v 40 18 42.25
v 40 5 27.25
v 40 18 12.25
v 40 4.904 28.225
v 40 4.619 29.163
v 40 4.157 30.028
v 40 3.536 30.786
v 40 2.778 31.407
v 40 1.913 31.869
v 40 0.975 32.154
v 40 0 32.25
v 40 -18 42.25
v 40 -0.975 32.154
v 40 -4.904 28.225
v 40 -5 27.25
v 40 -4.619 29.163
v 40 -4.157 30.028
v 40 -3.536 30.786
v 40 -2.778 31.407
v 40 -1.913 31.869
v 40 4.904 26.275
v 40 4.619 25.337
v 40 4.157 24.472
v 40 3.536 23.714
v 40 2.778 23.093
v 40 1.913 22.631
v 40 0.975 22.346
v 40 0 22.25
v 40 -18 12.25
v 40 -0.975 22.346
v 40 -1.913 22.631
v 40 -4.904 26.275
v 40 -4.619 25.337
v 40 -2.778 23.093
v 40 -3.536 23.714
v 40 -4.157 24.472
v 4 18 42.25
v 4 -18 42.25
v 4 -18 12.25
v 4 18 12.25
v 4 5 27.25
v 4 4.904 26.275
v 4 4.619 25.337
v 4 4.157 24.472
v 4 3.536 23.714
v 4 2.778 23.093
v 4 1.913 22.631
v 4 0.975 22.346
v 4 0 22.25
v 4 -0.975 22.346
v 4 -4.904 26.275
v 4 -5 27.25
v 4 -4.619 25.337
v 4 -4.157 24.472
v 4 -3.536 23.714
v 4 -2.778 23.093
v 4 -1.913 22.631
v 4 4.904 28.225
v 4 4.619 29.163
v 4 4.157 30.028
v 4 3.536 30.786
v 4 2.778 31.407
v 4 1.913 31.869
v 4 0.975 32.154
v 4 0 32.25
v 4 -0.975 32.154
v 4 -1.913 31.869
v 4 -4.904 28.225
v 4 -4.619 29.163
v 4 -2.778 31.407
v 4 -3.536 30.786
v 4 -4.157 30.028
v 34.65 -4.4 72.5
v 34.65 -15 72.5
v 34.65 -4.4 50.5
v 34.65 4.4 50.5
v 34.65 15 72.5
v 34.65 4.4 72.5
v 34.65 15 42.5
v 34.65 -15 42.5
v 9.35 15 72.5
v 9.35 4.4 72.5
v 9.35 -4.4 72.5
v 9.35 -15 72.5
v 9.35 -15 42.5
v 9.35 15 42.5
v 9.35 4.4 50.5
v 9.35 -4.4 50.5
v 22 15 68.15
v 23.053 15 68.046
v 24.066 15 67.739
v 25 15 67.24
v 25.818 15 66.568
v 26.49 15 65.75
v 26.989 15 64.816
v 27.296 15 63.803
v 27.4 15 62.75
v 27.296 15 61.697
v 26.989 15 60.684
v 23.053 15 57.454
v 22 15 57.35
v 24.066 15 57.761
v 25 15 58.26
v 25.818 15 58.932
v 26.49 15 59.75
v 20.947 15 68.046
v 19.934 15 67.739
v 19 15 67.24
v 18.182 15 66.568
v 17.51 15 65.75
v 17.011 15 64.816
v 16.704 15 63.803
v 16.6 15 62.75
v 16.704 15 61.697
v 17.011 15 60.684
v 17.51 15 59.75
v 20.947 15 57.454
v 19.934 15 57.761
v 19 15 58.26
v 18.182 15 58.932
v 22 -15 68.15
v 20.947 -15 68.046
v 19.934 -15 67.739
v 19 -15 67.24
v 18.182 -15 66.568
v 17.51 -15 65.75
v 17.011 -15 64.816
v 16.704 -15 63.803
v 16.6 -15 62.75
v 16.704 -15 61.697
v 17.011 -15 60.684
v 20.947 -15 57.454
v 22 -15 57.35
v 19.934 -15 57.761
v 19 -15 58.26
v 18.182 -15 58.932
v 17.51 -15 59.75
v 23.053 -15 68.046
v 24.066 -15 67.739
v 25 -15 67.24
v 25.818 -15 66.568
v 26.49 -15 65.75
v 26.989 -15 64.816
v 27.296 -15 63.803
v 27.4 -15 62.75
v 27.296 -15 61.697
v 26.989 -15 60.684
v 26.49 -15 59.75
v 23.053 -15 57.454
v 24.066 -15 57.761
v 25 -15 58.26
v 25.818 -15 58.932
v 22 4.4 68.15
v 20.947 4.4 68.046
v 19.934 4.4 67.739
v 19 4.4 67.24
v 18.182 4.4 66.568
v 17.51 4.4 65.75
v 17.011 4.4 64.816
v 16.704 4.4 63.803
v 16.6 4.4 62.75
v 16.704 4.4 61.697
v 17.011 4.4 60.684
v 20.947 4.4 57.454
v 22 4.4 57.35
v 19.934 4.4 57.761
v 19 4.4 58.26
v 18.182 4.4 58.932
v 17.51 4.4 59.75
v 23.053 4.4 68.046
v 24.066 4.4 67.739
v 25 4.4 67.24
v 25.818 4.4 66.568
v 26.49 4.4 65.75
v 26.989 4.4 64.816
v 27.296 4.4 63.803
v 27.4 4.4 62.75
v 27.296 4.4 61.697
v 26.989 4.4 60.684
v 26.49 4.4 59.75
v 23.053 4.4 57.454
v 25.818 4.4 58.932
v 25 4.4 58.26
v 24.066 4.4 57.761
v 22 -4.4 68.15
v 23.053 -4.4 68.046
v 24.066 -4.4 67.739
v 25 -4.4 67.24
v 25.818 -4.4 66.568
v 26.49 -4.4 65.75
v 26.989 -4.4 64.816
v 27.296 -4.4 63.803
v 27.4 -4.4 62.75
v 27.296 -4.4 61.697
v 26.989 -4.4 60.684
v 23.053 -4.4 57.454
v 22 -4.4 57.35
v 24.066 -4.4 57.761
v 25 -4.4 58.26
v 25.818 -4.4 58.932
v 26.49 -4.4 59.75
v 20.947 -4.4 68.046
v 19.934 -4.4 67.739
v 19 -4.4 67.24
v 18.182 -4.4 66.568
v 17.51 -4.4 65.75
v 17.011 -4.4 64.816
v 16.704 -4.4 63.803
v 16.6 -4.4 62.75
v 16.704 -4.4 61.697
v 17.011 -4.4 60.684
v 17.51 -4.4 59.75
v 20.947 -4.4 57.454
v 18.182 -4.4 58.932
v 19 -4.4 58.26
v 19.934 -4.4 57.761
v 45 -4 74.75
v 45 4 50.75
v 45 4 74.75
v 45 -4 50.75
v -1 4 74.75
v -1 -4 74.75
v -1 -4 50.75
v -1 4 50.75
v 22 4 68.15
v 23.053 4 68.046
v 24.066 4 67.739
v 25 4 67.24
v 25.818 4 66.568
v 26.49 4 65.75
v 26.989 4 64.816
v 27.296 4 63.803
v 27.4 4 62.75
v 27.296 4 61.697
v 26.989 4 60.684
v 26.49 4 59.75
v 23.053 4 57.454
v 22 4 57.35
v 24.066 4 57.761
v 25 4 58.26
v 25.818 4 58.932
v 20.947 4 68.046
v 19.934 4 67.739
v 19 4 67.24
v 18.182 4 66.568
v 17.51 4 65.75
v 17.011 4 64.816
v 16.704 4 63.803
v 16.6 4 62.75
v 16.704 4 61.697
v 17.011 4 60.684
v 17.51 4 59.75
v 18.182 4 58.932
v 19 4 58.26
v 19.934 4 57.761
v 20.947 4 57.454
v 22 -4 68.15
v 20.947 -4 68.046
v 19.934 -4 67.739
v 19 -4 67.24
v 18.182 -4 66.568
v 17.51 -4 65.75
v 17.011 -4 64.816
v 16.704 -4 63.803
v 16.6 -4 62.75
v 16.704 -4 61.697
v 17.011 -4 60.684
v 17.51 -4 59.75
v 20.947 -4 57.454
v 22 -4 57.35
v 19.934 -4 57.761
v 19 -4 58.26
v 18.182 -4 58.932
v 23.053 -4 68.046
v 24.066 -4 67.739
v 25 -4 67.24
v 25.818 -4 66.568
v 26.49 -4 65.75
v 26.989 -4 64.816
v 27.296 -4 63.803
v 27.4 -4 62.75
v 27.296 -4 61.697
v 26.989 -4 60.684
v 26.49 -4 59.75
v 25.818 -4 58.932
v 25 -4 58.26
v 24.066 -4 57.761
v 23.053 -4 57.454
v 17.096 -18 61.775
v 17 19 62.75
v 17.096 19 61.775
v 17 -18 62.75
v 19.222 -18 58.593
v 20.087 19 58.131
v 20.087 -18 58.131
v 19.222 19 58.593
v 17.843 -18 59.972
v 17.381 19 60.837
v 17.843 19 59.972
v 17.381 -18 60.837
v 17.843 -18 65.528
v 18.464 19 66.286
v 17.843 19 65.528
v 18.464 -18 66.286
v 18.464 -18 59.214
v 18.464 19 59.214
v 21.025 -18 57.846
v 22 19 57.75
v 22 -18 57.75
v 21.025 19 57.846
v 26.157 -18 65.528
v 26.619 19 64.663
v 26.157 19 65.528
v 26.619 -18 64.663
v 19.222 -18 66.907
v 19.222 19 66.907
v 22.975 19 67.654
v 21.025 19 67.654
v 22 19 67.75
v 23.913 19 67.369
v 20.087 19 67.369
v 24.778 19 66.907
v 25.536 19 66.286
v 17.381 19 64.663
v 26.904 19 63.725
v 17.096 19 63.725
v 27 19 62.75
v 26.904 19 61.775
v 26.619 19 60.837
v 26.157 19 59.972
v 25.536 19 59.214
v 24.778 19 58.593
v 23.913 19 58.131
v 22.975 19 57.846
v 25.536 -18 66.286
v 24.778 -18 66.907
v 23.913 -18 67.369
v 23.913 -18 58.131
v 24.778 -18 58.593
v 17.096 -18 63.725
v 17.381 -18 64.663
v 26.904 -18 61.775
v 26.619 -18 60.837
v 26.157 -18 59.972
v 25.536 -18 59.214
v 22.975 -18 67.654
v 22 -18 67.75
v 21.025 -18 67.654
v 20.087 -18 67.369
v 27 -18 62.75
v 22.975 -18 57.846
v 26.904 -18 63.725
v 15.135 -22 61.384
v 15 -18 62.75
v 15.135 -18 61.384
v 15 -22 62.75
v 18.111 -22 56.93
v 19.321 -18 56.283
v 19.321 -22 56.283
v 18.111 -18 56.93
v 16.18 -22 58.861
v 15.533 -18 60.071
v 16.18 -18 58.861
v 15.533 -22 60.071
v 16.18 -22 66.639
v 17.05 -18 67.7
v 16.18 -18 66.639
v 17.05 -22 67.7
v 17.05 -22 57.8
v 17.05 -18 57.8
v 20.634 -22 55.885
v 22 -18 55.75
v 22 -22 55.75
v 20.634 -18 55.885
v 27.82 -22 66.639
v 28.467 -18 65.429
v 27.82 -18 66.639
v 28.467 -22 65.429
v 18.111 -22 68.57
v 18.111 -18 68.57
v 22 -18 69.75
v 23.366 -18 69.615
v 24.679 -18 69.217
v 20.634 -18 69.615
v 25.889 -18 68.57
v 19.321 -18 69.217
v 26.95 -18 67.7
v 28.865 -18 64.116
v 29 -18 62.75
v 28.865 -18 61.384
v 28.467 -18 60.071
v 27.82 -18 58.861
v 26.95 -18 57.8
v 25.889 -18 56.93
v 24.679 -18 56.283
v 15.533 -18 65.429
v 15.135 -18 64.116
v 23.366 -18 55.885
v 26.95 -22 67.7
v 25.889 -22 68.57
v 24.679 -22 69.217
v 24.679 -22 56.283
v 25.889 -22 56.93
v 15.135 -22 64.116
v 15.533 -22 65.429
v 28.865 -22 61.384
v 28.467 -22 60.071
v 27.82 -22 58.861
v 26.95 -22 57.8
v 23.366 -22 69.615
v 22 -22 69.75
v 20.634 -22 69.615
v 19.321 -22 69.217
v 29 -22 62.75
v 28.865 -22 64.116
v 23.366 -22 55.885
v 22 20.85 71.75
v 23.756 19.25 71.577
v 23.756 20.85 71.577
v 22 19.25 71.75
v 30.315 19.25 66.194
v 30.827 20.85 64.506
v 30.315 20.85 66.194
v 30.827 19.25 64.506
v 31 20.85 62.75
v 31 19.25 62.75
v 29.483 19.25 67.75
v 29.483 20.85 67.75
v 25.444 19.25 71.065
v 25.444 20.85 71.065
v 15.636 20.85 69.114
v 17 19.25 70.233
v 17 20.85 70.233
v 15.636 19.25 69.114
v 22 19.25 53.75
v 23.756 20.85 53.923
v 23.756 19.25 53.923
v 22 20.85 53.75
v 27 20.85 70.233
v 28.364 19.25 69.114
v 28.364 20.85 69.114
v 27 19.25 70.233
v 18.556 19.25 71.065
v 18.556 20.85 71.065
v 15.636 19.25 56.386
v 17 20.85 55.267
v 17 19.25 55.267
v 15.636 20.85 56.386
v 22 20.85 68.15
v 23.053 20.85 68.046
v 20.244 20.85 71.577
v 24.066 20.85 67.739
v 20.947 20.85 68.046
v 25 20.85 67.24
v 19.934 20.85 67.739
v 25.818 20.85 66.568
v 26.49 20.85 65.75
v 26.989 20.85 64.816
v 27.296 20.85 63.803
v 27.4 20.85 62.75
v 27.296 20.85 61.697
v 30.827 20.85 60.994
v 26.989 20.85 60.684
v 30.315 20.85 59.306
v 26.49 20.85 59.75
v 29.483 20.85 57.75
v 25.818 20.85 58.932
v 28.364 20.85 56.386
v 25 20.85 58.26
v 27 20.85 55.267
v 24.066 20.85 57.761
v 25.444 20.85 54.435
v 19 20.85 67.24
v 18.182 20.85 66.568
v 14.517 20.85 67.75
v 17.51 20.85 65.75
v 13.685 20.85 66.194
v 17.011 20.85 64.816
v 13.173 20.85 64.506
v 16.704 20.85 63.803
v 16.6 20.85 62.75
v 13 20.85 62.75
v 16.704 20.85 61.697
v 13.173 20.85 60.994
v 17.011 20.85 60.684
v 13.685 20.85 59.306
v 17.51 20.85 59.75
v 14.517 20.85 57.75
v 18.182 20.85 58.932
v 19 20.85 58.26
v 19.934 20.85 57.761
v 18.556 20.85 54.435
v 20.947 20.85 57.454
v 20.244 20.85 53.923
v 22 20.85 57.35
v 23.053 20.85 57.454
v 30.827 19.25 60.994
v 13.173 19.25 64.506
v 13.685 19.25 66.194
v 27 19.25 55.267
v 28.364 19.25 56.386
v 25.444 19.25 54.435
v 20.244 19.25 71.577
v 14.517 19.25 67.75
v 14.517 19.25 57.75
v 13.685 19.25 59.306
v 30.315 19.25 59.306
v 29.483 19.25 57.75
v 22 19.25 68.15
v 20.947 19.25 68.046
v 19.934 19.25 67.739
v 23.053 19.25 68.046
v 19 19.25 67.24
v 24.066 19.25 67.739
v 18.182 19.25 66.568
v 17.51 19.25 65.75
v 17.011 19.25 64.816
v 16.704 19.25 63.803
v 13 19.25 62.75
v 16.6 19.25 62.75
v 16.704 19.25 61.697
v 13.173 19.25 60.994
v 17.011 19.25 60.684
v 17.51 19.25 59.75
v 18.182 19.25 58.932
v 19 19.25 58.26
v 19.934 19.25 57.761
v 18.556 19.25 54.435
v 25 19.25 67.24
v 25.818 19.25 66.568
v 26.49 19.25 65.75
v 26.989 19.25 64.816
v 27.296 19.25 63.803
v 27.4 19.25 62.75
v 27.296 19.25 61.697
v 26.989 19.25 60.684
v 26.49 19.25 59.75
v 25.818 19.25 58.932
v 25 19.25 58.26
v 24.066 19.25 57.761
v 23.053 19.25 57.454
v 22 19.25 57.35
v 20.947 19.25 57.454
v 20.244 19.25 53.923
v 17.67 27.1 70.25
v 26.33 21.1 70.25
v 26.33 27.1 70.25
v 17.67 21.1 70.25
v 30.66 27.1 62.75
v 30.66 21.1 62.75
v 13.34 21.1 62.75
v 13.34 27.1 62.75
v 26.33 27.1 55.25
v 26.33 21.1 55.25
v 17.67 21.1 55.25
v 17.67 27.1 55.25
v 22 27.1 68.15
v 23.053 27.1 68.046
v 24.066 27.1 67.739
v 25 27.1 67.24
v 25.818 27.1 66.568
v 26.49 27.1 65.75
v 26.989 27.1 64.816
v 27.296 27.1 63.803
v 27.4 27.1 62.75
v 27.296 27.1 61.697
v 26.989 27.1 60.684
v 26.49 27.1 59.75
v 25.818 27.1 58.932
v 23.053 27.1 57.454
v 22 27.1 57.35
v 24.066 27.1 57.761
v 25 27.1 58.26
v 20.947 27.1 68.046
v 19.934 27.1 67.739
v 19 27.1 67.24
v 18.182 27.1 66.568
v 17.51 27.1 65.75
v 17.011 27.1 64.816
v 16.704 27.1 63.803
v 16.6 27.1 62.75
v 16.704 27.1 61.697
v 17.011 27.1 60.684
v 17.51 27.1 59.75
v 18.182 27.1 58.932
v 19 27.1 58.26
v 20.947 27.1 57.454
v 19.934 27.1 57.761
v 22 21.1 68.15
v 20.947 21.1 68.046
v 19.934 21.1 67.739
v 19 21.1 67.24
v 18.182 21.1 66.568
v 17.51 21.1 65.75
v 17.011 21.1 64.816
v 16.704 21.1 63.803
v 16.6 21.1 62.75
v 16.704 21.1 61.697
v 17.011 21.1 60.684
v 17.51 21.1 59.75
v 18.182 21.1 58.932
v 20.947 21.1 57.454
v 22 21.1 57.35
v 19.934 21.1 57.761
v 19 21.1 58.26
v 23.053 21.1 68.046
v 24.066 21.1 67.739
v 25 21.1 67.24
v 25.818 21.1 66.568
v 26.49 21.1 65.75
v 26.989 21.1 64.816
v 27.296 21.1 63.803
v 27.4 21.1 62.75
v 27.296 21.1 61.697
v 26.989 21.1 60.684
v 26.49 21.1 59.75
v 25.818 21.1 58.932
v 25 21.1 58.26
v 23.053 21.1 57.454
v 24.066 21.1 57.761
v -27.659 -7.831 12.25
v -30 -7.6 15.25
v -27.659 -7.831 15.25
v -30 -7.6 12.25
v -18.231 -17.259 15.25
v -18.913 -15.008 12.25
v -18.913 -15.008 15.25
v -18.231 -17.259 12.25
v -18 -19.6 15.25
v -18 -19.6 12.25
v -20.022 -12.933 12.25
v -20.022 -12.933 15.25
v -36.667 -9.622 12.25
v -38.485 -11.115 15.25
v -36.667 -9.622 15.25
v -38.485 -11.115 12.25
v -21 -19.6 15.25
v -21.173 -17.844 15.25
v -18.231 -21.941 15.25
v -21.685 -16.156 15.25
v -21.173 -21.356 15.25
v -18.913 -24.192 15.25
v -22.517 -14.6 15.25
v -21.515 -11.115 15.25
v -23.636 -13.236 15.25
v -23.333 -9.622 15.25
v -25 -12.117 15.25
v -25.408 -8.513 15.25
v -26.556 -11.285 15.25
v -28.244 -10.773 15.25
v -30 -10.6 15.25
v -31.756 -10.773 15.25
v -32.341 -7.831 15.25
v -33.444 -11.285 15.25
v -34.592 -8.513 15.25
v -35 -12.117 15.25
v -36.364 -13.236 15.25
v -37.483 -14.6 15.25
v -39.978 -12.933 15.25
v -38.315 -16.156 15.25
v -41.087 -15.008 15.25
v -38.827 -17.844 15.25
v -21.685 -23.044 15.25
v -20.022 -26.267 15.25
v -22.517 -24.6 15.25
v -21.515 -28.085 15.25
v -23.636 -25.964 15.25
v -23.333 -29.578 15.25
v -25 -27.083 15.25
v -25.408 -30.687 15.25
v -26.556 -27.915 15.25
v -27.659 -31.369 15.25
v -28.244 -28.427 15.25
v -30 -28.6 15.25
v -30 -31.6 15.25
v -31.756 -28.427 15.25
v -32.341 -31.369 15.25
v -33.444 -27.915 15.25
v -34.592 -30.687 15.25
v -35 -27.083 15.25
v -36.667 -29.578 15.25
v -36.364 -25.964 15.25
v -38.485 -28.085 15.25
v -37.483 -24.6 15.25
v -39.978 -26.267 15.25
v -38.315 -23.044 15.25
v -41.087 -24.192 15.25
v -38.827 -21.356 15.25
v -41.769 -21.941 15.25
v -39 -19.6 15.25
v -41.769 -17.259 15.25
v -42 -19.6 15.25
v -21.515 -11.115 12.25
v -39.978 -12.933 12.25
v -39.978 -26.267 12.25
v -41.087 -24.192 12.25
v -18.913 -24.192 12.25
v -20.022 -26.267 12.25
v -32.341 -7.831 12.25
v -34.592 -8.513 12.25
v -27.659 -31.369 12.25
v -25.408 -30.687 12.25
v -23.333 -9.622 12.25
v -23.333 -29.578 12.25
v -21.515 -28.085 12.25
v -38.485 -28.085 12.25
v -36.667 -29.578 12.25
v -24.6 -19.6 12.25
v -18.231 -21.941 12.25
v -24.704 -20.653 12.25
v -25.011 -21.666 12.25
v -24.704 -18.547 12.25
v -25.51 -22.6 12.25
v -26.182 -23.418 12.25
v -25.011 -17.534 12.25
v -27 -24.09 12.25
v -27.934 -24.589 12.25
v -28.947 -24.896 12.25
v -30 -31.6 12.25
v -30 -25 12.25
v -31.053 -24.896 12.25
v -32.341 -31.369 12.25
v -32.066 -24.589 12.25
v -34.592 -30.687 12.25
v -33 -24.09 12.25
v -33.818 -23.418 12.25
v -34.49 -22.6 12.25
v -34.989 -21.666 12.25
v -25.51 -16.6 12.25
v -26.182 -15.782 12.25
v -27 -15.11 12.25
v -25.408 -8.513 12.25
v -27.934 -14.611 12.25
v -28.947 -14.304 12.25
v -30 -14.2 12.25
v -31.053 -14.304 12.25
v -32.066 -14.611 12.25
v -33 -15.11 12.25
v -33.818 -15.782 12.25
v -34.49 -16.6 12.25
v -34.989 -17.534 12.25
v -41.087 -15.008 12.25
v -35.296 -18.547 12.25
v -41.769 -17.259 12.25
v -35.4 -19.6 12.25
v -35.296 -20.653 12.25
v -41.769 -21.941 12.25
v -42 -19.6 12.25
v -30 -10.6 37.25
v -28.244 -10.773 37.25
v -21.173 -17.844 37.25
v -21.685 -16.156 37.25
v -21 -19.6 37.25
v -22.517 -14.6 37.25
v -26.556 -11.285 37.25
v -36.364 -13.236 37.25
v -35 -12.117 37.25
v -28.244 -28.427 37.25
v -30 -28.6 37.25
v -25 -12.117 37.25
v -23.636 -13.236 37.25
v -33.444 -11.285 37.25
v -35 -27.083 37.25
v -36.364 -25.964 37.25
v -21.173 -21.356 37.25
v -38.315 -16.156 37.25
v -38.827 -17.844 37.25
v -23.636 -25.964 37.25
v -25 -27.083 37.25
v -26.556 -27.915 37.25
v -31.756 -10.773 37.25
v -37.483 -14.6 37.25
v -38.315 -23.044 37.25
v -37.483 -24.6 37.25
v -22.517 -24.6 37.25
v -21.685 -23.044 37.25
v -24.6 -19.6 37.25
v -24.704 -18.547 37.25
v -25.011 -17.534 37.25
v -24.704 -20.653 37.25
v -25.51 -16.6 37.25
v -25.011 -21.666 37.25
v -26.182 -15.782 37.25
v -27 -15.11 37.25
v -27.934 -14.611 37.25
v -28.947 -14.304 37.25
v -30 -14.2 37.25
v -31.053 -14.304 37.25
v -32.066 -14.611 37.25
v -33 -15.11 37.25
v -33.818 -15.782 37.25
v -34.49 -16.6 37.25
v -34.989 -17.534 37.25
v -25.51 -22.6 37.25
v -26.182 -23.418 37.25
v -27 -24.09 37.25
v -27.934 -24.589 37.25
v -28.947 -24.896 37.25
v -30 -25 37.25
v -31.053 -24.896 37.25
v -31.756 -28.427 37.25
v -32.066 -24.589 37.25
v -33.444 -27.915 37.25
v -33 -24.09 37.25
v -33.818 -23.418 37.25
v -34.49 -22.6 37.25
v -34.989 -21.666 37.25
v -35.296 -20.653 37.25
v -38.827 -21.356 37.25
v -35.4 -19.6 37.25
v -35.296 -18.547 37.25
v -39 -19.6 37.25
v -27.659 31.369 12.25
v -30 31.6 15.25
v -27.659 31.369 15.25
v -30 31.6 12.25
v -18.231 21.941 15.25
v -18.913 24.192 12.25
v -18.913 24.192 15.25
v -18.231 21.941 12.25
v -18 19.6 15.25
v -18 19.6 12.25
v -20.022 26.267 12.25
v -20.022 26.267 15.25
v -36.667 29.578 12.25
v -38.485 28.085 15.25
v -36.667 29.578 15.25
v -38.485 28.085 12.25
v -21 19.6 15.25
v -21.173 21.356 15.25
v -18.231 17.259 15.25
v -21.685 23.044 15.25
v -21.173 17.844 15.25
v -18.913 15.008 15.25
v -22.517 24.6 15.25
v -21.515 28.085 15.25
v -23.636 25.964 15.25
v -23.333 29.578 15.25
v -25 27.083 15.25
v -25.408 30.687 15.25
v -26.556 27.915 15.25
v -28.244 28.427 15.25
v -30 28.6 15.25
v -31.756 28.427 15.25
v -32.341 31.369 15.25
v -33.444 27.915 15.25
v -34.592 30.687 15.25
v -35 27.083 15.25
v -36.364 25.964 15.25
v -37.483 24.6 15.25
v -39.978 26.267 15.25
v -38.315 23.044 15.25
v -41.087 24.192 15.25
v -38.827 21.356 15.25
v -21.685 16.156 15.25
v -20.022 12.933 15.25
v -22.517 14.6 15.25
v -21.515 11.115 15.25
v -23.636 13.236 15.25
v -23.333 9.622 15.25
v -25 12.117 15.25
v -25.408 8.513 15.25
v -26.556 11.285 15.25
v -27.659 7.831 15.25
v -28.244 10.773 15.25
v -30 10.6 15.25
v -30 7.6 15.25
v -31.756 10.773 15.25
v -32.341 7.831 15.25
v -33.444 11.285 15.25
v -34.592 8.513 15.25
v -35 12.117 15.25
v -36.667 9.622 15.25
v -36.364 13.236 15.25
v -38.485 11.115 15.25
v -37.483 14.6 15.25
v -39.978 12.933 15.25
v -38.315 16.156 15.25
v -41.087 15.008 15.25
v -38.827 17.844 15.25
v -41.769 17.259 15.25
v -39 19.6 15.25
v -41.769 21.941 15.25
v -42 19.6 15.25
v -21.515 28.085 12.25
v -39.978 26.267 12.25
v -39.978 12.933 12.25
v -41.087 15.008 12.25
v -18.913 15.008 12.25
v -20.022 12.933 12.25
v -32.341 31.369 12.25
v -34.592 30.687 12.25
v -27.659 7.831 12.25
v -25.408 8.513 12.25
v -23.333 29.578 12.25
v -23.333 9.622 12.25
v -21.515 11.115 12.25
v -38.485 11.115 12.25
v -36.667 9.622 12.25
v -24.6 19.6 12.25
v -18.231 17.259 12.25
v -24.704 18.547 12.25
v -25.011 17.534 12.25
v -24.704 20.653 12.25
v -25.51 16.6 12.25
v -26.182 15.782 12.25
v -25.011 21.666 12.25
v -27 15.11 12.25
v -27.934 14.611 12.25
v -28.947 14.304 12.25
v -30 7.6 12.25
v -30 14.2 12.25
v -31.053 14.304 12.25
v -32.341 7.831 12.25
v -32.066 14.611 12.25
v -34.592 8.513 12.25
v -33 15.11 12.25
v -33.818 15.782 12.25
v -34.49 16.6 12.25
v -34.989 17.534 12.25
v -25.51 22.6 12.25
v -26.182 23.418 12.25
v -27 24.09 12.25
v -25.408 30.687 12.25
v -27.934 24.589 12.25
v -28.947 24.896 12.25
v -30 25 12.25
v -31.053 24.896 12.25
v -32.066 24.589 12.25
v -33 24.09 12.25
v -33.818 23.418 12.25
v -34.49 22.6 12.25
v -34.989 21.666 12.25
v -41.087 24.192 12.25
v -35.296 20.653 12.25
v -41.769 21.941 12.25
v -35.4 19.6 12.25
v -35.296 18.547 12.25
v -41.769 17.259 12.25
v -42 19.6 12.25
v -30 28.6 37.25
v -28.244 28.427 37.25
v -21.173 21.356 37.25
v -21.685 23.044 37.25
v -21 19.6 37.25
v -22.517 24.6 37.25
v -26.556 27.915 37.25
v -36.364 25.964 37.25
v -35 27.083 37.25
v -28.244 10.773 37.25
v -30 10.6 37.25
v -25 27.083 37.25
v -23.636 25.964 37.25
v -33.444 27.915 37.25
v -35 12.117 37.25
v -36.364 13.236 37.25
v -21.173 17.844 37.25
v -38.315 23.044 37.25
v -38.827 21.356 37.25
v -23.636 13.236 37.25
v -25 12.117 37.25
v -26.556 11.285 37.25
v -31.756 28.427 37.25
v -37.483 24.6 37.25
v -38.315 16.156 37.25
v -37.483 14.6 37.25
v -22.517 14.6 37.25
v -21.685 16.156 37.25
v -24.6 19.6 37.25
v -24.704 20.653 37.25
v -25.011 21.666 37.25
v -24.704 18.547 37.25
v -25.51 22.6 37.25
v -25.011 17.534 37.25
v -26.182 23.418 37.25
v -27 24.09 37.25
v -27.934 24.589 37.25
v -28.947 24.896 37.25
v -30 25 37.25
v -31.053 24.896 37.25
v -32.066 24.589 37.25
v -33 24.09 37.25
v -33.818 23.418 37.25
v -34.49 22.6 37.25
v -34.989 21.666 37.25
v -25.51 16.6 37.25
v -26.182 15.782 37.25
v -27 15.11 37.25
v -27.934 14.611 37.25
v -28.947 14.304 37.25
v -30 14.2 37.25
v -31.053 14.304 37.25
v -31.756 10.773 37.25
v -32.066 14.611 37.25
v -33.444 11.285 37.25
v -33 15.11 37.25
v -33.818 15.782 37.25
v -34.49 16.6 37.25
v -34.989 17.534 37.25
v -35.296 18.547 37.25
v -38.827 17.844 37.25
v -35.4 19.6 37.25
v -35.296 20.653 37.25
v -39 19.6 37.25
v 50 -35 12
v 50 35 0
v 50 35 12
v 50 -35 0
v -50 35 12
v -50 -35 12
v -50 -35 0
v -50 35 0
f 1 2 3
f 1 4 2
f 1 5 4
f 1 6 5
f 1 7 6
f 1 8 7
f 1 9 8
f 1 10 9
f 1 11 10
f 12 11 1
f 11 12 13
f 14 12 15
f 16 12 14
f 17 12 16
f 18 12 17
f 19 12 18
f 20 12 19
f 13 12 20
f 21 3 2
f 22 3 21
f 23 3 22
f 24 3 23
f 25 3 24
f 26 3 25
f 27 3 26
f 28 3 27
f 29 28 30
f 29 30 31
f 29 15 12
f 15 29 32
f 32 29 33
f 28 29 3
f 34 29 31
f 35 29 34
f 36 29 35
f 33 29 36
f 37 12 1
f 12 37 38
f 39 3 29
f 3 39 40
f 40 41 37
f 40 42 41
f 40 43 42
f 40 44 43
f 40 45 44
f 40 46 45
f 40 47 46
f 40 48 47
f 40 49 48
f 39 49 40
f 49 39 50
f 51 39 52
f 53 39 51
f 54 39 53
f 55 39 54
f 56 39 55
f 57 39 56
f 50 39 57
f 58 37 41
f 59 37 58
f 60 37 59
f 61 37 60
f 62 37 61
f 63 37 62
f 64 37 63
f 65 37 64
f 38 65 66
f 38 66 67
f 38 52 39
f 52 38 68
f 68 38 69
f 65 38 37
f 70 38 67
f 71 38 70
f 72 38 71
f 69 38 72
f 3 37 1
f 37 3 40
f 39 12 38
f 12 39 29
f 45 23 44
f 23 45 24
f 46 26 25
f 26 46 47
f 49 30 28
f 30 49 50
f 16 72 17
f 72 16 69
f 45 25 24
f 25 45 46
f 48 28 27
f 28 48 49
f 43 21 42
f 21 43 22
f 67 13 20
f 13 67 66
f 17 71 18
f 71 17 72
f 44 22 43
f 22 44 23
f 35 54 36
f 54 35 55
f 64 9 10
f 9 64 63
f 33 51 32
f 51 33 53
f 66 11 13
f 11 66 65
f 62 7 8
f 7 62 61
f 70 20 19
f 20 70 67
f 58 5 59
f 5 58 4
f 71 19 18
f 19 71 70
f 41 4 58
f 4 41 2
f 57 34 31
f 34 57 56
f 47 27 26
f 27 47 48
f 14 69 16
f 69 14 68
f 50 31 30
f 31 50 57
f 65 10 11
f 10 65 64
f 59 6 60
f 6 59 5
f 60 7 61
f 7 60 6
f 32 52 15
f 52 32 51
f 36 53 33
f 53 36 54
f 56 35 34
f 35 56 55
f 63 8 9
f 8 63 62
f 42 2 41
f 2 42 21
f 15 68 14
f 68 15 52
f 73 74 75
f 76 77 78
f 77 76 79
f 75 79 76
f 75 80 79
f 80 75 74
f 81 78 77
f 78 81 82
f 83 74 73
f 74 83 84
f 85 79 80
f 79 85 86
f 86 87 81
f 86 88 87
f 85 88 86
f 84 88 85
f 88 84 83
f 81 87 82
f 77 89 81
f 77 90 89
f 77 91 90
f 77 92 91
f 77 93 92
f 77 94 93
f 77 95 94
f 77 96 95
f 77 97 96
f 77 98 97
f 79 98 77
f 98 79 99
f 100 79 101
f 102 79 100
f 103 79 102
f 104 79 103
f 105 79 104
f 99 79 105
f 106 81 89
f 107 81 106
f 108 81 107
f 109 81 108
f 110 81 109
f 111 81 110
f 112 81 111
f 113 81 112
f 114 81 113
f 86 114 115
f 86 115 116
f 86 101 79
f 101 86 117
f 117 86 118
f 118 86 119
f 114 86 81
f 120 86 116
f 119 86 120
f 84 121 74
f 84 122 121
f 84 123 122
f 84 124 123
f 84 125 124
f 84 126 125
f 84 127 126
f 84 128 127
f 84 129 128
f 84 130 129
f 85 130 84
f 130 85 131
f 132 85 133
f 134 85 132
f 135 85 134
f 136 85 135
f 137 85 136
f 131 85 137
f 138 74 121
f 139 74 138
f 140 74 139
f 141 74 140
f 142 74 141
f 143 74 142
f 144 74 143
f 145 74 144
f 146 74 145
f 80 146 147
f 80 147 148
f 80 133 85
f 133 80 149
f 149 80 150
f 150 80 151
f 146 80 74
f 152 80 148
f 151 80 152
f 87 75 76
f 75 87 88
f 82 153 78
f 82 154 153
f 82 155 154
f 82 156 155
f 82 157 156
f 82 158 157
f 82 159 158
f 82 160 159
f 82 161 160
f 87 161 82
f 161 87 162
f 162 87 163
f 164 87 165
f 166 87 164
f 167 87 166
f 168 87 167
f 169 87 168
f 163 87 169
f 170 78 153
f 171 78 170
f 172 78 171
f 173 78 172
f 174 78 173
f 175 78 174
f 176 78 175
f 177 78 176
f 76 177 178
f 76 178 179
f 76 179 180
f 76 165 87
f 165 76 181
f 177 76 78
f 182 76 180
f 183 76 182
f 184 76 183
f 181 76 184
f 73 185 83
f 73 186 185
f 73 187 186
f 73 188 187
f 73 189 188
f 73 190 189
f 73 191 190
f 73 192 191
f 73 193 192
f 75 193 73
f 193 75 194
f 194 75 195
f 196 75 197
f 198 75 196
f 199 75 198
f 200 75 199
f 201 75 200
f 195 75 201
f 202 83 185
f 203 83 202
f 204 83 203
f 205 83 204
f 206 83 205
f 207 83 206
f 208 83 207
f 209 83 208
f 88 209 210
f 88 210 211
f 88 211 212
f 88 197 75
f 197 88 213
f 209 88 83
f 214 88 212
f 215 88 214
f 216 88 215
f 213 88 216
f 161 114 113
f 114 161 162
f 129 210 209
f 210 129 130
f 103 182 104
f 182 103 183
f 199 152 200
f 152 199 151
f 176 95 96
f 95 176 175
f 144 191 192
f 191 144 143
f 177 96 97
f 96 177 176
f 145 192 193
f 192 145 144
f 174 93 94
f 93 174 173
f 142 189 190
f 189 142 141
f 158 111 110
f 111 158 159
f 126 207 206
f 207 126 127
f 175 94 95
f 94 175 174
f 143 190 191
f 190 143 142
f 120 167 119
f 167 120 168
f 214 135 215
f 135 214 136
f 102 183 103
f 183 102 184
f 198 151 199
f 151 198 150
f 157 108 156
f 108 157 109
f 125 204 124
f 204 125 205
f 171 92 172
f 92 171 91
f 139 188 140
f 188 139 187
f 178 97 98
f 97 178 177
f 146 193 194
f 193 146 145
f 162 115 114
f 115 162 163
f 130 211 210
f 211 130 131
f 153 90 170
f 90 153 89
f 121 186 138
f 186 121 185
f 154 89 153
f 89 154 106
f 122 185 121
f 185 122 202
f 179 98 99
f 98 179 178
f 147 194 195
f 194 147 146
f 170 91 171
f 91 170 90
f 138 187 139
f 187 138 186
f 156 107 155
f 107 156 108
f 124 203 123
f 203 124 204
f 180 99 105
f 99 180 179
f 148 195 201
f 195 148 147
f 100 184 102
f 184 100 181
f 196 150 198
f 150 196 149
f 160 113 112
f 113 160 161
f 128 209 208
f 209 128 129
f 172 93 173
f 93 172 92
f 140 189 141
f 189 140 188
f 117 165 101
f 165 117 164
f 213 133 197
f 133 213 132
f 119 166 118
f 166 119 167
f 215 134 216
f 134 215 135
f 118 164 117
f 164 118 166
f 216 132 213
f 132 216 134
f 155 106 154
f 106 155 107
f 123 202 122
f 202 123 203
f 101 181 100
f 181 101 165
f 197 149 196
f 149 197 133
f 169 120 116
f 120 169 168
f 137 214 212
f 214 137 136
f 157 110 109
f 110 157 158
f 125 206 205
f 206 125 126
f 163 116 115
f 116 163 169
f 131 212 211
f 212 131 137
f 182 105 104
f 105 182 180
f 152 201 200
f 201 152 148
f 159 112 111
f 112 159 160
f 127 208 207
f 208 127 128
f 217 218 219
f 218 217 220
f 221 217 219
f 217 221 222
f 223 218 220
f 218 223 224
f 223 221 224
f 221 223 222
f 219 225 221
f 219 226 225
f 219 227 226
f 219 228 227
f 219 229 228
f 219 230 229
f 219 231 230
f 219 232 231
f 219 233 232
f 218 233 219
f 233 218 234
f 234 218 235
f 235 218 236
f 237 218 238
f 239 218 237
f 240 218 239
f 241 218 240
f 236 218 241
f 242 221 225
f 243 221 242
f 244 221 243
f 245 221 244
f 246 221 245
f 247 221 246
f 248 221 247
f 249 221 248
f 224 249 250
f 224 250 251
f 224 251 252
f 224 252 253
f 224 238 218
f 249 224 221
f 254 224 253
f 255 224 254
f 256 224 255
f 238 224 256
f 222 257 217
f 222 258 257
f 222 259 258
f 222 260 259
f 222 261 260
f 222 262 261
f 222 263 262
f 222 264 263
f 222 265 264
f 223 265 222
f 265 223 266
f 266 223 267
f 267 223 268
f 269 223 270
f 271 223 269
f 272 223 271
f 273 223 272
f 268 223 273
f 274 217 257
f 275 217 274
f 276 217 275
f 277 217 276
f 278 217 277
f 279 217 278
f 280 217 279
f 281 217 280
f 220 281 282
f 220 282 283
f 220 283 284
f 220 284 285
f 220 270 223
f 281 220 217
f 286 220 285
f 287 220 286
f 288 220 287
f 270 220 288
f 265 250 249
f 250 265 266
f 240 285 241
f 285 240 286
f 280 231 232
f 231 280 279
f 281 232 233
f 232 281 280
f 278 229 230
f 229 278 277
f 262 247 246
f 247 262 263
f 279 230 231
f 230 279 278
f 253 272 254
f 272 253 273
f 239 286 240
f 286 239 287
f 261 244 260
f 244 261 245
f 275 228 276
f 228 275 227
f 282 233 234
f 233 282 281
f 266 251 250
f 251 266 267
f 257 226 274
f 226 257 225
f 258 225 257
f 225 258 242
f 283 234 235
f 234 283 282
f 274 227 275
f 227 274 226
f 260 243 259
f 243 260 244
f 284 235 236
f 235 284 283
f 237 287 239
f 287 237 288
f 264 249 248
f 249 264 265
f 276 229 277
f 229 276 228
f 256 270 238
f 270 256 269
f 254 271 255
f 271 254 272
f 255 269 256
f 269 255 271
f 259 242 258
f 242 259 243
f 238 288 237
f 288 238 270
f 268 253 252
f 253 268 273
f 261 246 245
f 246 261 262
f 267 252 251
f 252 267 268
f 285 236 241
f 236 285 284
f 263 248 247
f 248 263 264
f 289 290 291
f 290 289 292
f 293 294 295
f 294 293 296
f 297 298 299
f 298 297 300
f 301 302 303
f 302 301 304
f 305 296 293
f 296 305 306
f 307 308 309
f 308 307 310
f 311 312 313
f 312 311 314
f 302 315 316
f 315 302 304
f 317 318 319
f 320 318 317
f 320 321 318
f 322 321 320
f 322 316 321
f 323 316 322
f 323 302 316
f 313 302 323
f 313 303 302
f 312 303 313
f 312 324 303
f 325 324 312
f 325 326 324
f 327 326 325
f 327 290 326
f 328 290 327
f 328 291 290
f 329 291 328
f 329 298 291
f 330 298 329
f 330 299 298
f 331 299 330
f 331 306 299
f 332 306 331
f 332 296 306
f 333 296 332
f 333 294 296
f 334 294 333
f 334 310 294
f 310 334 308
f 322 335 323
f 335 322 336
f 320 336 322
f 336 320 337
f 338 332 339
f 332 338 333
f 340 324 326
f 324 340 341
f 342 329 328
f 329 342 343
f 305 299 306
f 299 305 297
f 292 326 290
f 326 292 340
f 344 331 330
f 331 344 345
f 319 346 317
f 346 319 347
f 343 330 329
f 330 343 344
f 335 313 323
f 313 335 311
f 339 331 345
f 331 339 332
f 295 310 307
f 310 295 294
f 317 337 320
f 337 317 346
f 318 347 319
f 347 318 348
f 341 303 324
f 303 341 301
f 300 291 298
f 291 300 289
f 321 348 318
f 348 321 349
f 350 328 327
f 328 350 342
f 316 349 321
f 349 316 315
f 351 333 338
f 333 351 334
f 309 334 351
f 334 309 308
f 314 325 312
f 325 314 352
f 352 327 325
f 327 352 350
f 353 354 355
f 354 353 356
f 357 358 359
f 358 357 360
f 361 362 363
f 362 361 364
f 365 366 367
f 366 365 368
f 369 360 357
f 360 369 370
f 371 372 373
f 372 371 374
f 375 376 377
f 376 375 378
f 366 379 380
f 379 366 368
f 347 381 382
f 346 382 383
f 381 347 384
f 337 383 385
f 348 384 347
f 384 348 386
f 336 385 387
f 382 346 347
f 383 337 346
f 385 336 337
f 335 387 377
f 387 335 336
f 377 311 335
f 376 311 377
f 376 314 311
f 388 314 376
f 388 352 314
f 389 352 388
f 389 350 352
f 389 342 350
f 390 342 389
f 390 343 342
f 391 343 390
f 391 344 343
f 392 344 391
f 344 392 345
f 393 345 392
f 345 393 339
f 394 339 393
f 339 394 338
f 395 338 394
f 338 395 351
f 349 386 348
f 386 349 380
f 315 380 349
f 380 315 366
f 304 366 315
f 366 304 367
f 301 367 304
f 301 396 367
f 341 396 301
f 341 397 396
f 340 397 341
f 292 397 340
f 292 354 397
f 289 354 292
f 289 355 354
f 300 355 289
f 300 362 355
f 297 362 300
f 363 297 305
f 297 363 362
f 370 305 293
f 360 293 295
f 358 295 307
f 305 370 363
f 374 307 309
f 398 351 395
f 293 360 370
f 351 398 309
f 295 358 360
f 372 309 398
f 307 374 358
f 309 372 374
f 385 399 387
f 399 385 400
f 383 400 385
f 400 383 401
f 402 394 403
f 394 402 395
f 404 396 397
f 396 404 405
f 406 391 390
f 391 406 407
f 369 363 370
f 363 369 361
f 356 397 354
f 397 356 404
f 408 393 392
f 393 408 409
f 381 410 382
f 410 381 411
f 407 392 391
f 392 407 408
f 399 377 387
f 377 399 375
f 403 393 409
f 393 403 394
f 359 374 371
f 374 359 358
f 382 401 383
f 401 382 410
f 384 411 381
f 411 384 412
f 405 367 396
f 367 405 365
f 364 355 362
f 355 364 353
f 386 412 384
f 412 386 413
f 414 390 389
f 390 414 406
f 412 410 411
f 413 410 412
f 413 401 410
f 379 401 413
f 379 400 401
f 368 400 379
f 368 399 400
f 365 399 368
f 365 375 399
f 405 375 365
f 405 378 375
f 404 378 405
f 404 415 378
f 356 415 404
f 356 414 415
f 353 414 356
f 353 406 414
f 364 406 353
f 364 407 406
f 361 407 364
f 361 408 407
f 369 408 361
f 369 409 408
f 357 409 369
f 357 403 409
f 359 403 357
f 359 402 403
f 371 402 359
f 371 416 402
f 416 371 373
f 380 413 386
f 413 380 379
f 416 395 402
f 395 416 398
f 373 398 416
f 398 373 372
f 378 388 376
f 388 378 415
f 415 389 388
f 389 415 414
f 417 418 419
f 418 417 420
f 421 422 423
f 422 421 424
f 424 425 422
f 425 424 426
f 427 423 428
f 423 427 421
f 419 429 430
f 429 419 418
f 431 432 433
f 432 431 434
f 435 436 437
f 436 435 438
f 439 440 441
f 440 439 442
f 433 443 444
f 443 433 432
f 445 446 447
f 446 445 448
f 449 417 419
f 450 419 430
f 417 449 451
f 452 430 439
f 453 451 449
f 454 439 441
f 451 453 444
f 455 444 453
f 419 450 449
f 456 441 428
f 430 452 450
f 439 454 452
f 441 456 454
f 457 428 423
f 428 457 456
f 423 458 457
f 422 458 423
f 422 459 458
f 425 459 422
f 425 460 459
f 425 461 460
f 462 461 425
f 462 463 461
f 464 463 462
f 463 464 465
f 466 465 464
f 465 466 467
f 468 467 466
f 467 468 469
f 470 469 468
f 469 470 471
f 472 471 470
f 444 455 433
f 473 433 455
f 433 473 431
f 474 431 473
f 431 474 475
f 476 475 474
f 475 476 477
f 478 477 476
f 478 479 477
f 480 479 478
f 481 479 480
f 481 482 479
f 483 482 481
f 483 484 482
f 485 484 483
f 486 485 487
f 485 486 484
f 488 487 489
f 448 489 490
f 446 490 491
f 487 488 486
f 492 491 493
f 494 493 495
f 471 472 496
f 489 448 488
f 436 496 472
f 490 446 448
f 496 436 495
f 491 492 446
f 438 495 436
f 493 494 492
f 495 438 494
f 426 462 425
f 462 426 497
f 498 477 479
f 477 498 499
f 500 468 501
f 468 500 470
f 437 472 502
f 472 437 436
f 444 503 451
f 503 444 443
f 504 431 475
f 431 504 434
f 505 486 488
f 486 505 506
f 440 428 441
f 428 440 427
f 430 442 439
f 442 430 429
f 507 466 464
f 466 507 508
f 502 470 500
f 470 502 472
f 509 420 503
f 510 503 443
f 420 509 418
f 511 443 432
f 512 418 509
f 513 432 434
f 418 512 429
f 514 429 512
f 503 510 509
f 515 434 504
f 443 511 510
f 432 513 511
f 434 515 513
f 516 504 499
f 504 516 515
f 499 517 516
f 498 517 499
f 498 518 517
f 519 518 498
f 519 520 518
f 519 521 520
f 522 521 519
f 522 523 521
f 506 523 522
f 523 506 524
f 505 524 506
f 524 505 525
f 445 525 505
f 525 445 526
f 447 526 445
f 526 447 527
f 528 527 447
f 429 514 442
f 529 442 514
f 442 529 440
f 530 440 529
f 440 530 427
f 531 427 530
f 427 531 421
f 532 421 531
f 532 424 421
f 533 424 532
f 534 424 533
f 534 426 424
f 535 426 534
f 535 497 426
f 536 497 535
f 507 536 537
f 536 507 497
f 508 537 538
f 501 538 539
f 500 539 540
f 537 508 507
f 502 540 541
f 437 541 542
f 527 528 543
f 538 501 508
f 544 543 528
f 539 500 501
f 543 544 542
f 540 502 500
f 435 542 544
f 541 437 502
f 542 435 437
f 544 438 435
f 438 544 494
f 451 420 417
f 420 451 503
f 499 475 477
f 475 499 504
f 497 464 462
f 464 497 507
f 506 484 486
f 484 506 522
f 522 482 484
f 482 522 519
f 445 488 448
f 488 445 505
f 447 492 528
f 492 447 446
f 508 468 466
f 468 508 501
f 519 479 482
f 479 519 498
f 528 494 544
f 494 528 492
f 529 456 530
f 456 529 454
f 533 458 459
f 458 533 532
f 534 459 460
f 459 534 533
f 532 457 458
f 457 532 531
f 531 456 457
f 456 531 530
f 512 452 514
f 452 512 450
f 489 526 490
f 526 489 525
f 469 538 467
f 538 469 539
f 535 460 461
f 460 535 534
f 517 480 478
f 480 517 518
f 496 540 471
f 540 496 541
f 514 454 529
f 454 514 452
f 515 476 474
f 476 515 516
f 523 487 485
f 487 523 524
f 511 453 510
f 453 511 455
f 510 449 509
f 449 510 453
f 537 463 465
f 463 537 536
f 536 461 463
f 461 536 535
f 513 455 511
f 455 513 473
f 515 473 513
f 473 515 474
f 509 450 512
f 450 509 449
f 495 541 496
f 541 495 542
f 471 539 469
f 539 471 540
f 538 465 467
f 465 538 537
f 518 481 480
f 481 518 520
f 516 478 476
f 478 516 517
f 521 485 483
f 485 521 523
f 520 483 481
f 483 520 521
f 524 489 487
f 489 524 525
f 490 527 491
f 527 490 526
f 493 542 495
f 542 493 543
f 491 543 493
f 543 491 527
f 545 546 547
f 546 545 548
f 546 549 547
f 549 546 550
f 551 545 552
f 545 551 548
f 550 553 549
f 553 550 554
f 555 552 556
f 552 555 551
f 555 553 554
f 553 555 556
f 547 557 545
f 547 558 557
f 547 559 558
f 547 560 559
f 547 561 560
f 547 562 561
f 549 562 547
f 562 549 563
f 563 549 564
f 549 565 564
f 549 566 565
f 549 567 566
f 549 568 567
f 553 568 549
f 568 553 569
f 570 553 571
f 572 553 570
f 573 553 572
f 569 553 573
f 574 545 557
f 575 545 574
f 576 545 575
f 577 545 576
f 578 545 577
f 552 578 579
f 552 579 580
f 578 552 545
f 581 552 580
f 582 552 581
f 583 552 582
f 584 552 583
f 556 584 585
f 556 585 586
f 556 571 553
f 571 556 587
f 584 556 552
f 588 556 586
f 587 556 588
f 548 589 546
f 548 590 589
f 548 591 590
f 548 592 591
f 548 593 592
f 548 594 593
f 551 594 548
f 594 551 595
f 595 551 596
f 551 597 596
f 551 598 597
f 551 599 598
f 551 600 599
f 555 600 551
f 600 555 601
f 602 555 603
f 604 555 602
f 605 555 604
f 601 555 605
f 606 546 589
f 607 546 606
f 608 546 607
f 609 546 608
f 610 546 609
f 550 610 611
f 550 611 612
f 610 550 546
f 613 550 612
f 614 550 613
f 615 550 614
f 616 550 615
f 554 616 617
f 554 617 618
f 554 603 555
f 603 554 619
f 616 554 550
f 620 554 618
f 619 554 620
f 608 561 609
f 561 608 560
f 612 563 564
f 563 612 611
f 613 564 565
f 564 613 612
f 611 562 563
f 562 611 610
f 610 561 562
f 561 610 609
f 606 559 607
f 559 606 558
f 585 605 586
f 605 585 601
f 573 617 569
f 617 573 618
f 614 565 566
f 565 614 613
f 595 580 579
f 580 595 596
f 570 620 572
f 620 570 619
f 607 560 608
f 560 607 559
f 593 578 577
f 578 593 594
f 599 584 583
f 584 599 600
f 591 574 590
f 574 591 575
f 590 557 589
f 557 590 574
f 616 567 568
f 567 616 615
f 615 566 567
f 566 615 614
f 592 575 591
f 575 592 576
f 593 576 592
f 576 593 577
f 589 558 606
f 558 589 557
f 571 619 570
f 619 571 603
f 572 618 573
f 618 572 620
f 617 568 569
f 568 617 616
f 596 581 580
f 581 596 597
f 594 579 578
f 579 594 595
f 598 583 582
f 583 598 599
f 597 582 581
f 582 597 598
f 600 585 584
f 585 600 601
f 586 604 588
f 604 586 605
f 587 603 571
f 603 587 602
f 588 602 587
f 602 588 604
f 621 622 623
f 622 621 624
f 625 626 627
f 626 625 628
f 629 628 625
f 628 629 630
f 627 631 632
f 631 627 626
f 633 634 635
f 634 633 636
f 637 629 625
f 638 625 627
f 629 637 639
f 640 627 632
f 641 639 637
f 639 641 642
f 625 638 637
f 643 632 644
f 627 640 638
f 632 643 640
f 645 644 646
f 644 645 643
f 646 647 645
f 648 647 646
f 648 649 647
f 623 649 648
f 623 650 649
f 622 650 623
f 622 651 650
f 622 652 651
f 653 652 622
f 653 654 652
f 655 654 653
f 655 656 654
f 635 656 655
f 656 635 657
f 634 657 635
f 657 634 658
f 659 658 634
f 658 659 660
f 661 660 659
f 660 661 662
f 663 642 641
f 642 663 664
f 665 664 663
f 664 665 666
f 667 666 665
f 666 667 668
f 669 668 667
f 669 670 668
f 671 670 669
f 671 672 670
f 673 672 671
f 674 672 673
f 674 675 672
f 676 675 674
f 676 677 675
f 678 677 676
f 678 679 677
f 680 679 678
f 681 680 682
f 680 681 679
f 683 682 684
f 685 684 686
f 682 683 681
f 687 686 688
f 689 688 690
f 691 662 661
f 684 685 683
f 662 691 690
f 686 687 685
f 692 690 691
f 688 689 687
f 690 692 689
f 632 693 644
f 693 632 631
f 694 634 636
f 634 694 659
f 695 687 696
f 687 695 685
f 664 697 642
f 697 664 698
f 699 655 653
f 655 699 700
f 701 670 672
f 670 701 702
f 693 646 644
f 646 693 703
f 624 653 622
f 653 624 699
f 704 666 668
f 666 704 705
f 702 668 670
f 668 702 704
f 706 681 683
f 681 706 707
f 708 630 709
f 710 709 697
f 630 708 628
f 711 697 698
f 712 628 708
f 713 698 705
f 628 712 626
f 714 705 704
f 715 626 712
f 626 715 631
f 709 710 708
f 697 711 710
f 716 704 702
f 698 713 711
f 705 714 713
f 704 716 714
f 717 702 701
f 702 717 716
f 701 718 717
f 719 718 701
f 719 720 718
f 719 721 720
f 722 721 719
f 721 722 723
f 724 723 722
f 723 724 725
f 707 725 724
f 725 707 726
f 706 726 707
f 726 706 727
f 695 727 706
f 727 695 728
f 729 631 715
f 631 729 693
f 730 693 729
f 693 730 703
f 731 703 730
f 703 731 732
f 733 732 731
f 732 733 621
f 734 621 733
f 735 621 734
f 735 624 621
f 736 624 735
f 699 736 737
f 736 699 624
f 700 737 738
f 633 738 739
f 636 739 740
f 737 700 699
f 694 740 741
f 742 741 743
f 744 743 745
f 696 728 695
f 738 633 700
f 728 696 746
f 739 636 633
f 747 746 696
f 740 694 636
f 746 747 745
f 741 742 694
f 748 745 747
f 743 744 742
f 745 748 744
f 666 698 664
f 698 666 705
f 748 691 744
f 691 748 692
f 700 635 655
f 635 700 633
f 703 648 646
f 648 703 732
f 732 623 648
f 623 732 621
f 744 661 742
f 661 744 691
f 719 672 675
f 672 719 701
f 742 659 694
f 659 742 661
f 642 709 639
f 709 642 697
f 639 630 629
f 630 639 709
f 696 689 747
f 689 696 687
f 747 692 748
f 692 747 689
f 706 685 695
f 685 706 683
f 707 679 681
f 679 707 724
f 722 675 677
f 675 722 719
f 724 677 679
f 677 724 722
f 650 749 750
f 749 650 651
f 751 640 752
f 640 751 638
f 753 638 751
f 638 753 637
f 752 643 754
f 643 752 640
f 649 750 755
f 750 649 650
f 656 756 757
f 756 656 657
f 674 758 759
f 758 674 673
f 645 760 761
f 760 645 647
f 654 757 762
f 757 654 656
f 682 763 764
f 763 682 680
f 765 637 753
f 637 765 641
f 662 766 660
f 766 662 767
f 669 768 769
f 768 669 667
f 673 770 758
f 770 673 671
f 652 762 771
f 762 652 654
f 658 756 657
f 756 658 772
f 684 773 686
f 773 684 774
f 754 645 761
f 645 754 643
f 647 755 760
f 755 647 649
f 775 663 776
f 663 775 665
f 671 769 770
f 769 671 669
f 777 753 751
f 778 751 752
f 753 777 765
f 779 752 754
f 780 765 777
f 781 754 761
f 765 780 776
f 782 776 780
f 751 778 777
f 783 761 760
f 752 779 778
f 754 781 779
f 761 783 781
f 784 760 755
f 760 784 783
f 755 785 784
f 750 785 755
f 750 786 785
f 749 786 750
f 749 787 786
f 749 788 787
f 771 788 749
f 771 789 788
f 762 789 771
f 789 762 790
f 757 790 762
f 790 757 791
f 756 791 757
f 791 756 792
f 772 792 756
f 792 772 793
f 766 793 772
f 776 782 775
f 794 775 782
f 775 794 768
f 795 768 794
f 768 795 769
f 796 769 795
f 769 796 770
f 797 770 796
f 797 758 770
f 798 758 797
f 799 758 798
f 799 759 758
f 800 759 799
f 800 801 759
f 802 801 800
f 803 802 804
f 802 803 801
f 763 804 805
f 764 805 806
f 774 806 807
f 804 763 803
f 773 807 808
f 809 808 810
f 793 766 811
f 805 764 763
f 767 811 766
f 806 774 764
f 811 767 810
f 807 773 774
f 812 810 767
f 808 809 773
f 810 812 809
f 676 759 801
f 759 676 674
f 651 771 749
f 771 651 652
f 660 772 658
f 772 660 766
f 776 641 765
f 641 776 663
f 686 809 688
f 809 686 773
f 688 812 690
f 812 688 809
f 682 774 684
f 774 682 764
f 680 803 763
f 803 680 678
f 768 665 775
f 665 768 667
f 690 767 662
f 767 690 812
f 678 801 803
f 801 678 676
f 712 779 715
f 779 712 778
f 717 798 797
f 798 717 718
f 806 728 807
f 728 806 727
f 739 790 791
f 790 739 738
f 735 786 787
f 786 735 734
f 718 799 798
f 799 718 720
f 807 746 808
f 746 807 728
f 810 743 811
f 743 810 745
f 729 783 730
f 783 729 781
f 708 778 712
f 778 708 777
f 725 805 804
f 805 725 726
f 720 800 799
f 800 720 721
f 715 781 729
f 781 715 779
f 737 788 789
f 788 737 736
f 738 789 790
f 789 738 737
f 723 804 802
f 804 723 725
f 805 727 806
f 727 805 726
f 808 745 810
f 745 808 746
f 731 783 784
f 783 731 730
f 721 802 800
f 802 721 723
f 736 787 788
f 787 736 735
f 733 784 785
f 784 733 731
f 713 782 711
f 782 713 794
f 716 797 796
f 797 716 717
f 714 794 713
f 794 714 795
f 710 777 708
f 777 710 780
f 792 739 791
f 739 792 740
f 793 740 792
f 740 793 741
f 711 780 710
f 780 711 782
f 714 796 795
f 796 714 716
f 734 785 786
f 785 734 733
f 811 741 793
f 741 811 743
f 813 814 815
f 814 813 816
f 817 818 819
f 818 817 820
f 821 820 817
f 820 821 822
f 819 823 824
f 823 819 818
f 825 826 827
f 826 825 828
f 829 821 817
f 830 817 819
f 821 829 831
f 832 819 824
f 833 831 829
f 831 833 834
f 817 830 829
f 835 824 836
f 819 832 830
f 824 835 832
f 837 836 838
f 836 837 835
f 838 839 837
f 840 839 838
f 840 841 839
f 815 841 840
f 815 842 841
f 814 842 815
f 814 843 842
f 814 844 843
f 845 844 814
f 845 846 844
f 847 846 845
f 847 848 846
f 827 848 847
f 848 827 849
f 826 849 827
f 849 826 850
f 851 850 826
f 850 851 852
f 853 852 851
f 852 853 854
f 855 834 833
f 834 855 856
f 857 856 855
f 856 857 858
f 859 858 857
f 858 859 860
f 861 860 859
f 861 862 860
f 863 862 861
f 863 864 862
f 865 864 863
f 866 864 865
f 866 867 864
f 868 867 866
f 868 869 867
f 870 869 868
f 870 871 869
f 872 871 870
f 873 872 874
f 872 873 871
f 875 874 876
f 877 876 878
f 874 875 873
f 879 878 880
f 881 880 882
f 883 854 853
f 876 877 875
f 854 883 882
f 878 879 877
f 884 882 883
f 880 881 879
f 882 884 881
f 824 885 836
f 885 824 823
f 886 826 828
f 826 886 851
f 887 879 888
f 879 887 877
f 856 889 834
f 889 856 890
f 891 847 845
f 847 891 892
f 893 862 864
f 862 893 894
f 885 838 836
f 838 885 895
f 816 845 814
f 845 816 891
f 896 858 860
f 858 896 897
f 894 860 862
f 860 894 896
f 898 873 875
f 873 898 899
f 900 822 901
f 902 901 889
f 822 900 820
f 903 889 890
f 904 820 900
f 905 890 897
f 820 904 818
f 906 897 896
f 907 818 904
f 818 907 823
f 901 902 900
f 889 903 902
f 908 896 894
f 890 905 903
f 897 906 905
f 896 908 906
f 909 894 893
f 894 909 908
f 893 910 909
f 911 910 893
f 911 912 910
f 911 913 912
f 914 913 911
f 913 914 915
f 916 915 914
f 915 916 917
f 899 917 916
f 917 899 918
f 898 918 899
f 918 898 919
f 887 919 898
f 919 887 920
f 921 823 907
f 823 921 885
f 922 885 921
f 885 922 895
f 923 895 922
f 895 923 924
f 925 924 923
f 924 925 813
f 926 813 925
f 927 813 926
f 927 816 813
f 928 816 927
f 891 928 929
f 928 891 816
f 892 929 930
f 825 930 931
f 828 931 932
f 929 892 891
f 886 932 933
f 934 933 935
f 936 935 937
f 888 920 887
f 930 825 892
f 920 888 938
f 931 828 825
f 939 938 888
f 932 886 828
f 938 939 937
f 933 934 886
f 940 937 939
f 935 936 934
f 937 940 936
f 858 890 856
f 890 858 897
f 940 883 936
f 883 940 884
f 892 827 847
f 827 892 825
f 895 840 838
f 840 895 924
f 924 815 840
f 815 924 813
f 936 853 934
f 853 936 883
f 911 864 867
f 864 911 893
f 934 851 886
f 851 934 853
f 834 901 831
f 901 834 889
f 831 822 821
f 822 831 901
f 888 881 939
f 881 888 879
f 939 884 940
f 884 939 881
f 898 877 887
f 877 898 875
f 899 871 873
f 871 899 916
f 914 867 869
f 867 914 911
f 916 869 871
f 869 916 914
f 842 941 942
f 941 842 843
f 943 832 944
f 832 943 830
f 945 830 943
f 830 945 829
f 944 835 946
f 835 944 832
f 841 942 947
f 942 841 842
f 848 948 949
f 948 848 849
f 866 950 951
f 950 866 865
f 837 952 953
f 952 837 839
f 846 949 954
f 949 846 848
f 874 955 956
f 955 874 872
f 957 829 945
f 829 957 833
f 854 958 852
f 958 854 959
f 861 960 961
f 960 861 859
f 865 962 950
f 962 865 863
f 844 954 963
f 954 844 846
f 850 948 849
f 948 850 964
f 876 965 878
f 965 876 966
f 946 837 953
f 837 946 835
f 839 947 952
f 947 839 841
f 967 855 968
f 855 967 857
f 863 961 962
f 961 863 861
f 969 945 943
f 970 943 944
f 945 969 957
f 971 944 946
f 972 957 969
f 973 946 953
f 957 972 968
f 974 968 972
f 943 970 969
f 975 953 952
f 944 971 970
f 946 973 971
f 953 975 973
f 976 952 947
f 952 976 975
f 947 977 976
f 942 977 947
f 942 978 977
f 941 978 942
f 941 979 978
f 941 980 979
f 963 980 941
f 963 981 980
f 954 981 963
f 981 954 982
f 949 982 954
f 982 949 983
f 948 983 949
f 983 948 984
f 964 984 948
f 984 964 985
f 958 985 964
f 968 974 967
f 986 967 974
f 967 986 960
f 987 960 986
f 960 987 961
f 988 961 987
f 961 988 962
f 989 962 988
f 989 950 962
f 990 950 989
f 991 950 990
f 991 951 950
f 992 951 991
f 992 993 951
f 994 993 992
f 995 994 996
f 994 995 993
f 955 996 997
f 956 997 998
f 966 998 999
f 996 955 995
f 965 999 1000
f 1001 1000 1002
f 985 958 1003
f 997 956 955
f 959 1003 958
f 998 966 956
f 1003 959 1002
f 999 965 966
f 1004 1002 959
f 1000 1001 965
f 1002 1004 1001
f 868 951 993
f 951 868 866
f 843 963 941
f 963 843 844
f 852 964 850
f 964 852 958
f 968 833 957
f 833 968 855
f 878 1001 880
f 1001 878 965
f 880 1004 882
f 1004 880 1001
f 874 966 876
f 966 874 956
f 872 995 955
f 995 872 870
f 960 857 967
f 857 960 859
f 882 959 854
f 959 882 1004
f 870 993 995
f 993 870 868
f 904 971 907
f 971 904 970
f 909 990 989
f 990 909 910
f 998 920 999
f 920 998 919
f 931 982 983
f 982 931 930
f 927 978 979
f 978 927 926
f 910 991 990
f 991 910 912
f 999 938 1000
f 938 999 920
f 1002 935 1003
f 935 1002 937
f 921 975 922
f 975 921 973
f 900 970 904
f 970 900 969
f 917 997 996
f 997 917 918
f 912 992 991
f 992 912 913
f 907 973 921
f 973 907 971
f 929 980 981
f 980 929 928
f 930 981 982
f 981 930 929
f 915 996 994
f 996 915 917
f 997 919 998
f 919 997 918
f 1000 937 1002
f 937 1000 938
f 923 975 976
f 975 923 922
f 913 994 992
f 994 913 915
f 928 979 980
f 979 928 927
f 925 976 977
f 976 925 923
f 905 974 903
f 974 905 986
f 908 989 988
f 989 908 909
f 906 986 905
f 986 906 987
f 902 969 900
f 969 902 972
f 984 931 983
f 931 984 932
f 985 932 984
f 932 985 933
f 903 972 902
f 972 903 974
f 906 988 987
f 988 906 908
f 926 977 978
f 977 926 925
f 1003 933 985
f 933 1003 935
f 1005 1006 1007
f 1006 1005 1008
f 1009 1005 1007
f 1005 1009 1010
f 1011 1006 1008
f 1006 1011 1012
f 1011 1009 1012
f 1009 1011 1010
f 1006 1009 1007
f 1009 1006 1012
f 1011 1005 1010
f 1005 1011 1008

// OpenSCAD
$fn = 32;

// ------------------------------------------------------------------------
// Indexing jig: plate 100 x 70 mm, pin d10
// Every part is its own module, assembly() places every instance.
// ------------------------------------------------------------------------

// --- part 1 ---
module jig_plate() {
  difference() {
    translate([-50, -35, 0]) cube([100, 70, 12]);
  }
}

// --- part 2 ---
module locator_block() {
  difference() {
    translate([-18, -18, 0]) cube([36, 36, 30]);
    translate([0, 0, 15]) rotate([0, 90, 0]) cylinder(h = 38, d = 10, center = true);
  }
}

// --- part 3 ---
module index_fork() {
  difference() {
    translate([-12.65, -15, 0]) cube([25.3, 30, 30]);
    translate([-13.65, -4.4, 8]) cube([27.3, 8.8, 23]);
    translate([0, 0, 20.25]) rotate([90, 0, 0]) cylinder(h = 32, d = 10.8, center = true);
  }
}

// --- part 4 ---
module index_arm() {
  difference() {
    translate([-23, -4, 0]) cube([46, 8, 24]);
    translate([0, 0, 12]) rotate([90, 0, 0]) cylinder(h = 10, d = 10.8, center = true);
  }
}

// --- part 5 ---
module index_pin() {
  rotate([0, 90, 0]) cylinder(h = 38, d = 10, center = true);
  translate([-22, 0, 0]) rotate([0, 90, 0]) cylinder(h = 4, d = 14);
}

// --- part 6 ---
module pin_washer() {
  difference() {
      translate([0, 0, 0]) cylinder(h = 1.6, d = 18);
      translate([0, 0, -1]) cylinder(h = 3.6, d = 10.8);
    }
}

// --- part 7 ---
module lock_nut() {
  difference() {
    linear_extrude(height = 6) polygon(points = [[8.66, 0], [4.33, 7.5], [-4.33, 7.5], [-8.66, 0], [-4.33, -7.5], [4.33, -7.5]]);
    translate([0, 0, -1]) cylinder(h = 8, d = 10.8);
  }
}

// --- part 8 ---
module guide_bush_a() {
  difference() {
    union() {
      cylinder(h = 3, d = 24);
      translate([0, 0, 3]) cylinder(h = 22, d = 18);
    }
    translate([0, 0, -1]) cylinder(h = 27, d = 10.8);
  }
}

// --- part 9 ---
module guide_bush_b() {
  difference() {
    union() {
      cylinder(h = 3, d = 24);
      translate([0, 0, 3]) cylinder(h = 22, d = 18);
    }
    translate([0, 0, -1]) cylinder(h = 27, d = 10.8);
  }
}

// --- assembly ---
module assembly() {
  color([0.80, 0.24, 0.20]) translate([0, 0, 0]) rotate([0, 0, 0]) jig_plate();
  color([0.20, 0.45, 0.75]) translate([22, 0, 12.25]) rotate([0, 0, 0]) locator_block();
  color([0.25, 0.62, 0.32]) translate([22, 0, 42.5]) rotate([0, 0, 0]) index_fork();
  color([0.92, 0.70, 0.18]) translate([22, 0, 50.75]) rotate([0, 0, 0]) index_arm();
  color([0.58, 0.35, 0.70]) translate([22, 0, 62.75]) rotate([0, 0, 90]) index_pin();
  color([0.16, 0.66, 0.66]) translate([22, 20.85, 62.75]) rotate([90, 0, 0]) pin_washer();
  color([0.85, 0.48, 0.18]) translate([22, 27.1, 62.75]) rotate([90, 0, 0]) lock_nut();
  color([0.55, 0.60, 0.65]) translate([-30, -19.6, 12.25]) rotate([0, 0, 0]) guide_bush_a();
  color([0.75, 0.30, 0.55]) translate([-30, 19.6, 12.25]) rotate([0, 0, 0]) guide_bush_b();
}

assembly();
